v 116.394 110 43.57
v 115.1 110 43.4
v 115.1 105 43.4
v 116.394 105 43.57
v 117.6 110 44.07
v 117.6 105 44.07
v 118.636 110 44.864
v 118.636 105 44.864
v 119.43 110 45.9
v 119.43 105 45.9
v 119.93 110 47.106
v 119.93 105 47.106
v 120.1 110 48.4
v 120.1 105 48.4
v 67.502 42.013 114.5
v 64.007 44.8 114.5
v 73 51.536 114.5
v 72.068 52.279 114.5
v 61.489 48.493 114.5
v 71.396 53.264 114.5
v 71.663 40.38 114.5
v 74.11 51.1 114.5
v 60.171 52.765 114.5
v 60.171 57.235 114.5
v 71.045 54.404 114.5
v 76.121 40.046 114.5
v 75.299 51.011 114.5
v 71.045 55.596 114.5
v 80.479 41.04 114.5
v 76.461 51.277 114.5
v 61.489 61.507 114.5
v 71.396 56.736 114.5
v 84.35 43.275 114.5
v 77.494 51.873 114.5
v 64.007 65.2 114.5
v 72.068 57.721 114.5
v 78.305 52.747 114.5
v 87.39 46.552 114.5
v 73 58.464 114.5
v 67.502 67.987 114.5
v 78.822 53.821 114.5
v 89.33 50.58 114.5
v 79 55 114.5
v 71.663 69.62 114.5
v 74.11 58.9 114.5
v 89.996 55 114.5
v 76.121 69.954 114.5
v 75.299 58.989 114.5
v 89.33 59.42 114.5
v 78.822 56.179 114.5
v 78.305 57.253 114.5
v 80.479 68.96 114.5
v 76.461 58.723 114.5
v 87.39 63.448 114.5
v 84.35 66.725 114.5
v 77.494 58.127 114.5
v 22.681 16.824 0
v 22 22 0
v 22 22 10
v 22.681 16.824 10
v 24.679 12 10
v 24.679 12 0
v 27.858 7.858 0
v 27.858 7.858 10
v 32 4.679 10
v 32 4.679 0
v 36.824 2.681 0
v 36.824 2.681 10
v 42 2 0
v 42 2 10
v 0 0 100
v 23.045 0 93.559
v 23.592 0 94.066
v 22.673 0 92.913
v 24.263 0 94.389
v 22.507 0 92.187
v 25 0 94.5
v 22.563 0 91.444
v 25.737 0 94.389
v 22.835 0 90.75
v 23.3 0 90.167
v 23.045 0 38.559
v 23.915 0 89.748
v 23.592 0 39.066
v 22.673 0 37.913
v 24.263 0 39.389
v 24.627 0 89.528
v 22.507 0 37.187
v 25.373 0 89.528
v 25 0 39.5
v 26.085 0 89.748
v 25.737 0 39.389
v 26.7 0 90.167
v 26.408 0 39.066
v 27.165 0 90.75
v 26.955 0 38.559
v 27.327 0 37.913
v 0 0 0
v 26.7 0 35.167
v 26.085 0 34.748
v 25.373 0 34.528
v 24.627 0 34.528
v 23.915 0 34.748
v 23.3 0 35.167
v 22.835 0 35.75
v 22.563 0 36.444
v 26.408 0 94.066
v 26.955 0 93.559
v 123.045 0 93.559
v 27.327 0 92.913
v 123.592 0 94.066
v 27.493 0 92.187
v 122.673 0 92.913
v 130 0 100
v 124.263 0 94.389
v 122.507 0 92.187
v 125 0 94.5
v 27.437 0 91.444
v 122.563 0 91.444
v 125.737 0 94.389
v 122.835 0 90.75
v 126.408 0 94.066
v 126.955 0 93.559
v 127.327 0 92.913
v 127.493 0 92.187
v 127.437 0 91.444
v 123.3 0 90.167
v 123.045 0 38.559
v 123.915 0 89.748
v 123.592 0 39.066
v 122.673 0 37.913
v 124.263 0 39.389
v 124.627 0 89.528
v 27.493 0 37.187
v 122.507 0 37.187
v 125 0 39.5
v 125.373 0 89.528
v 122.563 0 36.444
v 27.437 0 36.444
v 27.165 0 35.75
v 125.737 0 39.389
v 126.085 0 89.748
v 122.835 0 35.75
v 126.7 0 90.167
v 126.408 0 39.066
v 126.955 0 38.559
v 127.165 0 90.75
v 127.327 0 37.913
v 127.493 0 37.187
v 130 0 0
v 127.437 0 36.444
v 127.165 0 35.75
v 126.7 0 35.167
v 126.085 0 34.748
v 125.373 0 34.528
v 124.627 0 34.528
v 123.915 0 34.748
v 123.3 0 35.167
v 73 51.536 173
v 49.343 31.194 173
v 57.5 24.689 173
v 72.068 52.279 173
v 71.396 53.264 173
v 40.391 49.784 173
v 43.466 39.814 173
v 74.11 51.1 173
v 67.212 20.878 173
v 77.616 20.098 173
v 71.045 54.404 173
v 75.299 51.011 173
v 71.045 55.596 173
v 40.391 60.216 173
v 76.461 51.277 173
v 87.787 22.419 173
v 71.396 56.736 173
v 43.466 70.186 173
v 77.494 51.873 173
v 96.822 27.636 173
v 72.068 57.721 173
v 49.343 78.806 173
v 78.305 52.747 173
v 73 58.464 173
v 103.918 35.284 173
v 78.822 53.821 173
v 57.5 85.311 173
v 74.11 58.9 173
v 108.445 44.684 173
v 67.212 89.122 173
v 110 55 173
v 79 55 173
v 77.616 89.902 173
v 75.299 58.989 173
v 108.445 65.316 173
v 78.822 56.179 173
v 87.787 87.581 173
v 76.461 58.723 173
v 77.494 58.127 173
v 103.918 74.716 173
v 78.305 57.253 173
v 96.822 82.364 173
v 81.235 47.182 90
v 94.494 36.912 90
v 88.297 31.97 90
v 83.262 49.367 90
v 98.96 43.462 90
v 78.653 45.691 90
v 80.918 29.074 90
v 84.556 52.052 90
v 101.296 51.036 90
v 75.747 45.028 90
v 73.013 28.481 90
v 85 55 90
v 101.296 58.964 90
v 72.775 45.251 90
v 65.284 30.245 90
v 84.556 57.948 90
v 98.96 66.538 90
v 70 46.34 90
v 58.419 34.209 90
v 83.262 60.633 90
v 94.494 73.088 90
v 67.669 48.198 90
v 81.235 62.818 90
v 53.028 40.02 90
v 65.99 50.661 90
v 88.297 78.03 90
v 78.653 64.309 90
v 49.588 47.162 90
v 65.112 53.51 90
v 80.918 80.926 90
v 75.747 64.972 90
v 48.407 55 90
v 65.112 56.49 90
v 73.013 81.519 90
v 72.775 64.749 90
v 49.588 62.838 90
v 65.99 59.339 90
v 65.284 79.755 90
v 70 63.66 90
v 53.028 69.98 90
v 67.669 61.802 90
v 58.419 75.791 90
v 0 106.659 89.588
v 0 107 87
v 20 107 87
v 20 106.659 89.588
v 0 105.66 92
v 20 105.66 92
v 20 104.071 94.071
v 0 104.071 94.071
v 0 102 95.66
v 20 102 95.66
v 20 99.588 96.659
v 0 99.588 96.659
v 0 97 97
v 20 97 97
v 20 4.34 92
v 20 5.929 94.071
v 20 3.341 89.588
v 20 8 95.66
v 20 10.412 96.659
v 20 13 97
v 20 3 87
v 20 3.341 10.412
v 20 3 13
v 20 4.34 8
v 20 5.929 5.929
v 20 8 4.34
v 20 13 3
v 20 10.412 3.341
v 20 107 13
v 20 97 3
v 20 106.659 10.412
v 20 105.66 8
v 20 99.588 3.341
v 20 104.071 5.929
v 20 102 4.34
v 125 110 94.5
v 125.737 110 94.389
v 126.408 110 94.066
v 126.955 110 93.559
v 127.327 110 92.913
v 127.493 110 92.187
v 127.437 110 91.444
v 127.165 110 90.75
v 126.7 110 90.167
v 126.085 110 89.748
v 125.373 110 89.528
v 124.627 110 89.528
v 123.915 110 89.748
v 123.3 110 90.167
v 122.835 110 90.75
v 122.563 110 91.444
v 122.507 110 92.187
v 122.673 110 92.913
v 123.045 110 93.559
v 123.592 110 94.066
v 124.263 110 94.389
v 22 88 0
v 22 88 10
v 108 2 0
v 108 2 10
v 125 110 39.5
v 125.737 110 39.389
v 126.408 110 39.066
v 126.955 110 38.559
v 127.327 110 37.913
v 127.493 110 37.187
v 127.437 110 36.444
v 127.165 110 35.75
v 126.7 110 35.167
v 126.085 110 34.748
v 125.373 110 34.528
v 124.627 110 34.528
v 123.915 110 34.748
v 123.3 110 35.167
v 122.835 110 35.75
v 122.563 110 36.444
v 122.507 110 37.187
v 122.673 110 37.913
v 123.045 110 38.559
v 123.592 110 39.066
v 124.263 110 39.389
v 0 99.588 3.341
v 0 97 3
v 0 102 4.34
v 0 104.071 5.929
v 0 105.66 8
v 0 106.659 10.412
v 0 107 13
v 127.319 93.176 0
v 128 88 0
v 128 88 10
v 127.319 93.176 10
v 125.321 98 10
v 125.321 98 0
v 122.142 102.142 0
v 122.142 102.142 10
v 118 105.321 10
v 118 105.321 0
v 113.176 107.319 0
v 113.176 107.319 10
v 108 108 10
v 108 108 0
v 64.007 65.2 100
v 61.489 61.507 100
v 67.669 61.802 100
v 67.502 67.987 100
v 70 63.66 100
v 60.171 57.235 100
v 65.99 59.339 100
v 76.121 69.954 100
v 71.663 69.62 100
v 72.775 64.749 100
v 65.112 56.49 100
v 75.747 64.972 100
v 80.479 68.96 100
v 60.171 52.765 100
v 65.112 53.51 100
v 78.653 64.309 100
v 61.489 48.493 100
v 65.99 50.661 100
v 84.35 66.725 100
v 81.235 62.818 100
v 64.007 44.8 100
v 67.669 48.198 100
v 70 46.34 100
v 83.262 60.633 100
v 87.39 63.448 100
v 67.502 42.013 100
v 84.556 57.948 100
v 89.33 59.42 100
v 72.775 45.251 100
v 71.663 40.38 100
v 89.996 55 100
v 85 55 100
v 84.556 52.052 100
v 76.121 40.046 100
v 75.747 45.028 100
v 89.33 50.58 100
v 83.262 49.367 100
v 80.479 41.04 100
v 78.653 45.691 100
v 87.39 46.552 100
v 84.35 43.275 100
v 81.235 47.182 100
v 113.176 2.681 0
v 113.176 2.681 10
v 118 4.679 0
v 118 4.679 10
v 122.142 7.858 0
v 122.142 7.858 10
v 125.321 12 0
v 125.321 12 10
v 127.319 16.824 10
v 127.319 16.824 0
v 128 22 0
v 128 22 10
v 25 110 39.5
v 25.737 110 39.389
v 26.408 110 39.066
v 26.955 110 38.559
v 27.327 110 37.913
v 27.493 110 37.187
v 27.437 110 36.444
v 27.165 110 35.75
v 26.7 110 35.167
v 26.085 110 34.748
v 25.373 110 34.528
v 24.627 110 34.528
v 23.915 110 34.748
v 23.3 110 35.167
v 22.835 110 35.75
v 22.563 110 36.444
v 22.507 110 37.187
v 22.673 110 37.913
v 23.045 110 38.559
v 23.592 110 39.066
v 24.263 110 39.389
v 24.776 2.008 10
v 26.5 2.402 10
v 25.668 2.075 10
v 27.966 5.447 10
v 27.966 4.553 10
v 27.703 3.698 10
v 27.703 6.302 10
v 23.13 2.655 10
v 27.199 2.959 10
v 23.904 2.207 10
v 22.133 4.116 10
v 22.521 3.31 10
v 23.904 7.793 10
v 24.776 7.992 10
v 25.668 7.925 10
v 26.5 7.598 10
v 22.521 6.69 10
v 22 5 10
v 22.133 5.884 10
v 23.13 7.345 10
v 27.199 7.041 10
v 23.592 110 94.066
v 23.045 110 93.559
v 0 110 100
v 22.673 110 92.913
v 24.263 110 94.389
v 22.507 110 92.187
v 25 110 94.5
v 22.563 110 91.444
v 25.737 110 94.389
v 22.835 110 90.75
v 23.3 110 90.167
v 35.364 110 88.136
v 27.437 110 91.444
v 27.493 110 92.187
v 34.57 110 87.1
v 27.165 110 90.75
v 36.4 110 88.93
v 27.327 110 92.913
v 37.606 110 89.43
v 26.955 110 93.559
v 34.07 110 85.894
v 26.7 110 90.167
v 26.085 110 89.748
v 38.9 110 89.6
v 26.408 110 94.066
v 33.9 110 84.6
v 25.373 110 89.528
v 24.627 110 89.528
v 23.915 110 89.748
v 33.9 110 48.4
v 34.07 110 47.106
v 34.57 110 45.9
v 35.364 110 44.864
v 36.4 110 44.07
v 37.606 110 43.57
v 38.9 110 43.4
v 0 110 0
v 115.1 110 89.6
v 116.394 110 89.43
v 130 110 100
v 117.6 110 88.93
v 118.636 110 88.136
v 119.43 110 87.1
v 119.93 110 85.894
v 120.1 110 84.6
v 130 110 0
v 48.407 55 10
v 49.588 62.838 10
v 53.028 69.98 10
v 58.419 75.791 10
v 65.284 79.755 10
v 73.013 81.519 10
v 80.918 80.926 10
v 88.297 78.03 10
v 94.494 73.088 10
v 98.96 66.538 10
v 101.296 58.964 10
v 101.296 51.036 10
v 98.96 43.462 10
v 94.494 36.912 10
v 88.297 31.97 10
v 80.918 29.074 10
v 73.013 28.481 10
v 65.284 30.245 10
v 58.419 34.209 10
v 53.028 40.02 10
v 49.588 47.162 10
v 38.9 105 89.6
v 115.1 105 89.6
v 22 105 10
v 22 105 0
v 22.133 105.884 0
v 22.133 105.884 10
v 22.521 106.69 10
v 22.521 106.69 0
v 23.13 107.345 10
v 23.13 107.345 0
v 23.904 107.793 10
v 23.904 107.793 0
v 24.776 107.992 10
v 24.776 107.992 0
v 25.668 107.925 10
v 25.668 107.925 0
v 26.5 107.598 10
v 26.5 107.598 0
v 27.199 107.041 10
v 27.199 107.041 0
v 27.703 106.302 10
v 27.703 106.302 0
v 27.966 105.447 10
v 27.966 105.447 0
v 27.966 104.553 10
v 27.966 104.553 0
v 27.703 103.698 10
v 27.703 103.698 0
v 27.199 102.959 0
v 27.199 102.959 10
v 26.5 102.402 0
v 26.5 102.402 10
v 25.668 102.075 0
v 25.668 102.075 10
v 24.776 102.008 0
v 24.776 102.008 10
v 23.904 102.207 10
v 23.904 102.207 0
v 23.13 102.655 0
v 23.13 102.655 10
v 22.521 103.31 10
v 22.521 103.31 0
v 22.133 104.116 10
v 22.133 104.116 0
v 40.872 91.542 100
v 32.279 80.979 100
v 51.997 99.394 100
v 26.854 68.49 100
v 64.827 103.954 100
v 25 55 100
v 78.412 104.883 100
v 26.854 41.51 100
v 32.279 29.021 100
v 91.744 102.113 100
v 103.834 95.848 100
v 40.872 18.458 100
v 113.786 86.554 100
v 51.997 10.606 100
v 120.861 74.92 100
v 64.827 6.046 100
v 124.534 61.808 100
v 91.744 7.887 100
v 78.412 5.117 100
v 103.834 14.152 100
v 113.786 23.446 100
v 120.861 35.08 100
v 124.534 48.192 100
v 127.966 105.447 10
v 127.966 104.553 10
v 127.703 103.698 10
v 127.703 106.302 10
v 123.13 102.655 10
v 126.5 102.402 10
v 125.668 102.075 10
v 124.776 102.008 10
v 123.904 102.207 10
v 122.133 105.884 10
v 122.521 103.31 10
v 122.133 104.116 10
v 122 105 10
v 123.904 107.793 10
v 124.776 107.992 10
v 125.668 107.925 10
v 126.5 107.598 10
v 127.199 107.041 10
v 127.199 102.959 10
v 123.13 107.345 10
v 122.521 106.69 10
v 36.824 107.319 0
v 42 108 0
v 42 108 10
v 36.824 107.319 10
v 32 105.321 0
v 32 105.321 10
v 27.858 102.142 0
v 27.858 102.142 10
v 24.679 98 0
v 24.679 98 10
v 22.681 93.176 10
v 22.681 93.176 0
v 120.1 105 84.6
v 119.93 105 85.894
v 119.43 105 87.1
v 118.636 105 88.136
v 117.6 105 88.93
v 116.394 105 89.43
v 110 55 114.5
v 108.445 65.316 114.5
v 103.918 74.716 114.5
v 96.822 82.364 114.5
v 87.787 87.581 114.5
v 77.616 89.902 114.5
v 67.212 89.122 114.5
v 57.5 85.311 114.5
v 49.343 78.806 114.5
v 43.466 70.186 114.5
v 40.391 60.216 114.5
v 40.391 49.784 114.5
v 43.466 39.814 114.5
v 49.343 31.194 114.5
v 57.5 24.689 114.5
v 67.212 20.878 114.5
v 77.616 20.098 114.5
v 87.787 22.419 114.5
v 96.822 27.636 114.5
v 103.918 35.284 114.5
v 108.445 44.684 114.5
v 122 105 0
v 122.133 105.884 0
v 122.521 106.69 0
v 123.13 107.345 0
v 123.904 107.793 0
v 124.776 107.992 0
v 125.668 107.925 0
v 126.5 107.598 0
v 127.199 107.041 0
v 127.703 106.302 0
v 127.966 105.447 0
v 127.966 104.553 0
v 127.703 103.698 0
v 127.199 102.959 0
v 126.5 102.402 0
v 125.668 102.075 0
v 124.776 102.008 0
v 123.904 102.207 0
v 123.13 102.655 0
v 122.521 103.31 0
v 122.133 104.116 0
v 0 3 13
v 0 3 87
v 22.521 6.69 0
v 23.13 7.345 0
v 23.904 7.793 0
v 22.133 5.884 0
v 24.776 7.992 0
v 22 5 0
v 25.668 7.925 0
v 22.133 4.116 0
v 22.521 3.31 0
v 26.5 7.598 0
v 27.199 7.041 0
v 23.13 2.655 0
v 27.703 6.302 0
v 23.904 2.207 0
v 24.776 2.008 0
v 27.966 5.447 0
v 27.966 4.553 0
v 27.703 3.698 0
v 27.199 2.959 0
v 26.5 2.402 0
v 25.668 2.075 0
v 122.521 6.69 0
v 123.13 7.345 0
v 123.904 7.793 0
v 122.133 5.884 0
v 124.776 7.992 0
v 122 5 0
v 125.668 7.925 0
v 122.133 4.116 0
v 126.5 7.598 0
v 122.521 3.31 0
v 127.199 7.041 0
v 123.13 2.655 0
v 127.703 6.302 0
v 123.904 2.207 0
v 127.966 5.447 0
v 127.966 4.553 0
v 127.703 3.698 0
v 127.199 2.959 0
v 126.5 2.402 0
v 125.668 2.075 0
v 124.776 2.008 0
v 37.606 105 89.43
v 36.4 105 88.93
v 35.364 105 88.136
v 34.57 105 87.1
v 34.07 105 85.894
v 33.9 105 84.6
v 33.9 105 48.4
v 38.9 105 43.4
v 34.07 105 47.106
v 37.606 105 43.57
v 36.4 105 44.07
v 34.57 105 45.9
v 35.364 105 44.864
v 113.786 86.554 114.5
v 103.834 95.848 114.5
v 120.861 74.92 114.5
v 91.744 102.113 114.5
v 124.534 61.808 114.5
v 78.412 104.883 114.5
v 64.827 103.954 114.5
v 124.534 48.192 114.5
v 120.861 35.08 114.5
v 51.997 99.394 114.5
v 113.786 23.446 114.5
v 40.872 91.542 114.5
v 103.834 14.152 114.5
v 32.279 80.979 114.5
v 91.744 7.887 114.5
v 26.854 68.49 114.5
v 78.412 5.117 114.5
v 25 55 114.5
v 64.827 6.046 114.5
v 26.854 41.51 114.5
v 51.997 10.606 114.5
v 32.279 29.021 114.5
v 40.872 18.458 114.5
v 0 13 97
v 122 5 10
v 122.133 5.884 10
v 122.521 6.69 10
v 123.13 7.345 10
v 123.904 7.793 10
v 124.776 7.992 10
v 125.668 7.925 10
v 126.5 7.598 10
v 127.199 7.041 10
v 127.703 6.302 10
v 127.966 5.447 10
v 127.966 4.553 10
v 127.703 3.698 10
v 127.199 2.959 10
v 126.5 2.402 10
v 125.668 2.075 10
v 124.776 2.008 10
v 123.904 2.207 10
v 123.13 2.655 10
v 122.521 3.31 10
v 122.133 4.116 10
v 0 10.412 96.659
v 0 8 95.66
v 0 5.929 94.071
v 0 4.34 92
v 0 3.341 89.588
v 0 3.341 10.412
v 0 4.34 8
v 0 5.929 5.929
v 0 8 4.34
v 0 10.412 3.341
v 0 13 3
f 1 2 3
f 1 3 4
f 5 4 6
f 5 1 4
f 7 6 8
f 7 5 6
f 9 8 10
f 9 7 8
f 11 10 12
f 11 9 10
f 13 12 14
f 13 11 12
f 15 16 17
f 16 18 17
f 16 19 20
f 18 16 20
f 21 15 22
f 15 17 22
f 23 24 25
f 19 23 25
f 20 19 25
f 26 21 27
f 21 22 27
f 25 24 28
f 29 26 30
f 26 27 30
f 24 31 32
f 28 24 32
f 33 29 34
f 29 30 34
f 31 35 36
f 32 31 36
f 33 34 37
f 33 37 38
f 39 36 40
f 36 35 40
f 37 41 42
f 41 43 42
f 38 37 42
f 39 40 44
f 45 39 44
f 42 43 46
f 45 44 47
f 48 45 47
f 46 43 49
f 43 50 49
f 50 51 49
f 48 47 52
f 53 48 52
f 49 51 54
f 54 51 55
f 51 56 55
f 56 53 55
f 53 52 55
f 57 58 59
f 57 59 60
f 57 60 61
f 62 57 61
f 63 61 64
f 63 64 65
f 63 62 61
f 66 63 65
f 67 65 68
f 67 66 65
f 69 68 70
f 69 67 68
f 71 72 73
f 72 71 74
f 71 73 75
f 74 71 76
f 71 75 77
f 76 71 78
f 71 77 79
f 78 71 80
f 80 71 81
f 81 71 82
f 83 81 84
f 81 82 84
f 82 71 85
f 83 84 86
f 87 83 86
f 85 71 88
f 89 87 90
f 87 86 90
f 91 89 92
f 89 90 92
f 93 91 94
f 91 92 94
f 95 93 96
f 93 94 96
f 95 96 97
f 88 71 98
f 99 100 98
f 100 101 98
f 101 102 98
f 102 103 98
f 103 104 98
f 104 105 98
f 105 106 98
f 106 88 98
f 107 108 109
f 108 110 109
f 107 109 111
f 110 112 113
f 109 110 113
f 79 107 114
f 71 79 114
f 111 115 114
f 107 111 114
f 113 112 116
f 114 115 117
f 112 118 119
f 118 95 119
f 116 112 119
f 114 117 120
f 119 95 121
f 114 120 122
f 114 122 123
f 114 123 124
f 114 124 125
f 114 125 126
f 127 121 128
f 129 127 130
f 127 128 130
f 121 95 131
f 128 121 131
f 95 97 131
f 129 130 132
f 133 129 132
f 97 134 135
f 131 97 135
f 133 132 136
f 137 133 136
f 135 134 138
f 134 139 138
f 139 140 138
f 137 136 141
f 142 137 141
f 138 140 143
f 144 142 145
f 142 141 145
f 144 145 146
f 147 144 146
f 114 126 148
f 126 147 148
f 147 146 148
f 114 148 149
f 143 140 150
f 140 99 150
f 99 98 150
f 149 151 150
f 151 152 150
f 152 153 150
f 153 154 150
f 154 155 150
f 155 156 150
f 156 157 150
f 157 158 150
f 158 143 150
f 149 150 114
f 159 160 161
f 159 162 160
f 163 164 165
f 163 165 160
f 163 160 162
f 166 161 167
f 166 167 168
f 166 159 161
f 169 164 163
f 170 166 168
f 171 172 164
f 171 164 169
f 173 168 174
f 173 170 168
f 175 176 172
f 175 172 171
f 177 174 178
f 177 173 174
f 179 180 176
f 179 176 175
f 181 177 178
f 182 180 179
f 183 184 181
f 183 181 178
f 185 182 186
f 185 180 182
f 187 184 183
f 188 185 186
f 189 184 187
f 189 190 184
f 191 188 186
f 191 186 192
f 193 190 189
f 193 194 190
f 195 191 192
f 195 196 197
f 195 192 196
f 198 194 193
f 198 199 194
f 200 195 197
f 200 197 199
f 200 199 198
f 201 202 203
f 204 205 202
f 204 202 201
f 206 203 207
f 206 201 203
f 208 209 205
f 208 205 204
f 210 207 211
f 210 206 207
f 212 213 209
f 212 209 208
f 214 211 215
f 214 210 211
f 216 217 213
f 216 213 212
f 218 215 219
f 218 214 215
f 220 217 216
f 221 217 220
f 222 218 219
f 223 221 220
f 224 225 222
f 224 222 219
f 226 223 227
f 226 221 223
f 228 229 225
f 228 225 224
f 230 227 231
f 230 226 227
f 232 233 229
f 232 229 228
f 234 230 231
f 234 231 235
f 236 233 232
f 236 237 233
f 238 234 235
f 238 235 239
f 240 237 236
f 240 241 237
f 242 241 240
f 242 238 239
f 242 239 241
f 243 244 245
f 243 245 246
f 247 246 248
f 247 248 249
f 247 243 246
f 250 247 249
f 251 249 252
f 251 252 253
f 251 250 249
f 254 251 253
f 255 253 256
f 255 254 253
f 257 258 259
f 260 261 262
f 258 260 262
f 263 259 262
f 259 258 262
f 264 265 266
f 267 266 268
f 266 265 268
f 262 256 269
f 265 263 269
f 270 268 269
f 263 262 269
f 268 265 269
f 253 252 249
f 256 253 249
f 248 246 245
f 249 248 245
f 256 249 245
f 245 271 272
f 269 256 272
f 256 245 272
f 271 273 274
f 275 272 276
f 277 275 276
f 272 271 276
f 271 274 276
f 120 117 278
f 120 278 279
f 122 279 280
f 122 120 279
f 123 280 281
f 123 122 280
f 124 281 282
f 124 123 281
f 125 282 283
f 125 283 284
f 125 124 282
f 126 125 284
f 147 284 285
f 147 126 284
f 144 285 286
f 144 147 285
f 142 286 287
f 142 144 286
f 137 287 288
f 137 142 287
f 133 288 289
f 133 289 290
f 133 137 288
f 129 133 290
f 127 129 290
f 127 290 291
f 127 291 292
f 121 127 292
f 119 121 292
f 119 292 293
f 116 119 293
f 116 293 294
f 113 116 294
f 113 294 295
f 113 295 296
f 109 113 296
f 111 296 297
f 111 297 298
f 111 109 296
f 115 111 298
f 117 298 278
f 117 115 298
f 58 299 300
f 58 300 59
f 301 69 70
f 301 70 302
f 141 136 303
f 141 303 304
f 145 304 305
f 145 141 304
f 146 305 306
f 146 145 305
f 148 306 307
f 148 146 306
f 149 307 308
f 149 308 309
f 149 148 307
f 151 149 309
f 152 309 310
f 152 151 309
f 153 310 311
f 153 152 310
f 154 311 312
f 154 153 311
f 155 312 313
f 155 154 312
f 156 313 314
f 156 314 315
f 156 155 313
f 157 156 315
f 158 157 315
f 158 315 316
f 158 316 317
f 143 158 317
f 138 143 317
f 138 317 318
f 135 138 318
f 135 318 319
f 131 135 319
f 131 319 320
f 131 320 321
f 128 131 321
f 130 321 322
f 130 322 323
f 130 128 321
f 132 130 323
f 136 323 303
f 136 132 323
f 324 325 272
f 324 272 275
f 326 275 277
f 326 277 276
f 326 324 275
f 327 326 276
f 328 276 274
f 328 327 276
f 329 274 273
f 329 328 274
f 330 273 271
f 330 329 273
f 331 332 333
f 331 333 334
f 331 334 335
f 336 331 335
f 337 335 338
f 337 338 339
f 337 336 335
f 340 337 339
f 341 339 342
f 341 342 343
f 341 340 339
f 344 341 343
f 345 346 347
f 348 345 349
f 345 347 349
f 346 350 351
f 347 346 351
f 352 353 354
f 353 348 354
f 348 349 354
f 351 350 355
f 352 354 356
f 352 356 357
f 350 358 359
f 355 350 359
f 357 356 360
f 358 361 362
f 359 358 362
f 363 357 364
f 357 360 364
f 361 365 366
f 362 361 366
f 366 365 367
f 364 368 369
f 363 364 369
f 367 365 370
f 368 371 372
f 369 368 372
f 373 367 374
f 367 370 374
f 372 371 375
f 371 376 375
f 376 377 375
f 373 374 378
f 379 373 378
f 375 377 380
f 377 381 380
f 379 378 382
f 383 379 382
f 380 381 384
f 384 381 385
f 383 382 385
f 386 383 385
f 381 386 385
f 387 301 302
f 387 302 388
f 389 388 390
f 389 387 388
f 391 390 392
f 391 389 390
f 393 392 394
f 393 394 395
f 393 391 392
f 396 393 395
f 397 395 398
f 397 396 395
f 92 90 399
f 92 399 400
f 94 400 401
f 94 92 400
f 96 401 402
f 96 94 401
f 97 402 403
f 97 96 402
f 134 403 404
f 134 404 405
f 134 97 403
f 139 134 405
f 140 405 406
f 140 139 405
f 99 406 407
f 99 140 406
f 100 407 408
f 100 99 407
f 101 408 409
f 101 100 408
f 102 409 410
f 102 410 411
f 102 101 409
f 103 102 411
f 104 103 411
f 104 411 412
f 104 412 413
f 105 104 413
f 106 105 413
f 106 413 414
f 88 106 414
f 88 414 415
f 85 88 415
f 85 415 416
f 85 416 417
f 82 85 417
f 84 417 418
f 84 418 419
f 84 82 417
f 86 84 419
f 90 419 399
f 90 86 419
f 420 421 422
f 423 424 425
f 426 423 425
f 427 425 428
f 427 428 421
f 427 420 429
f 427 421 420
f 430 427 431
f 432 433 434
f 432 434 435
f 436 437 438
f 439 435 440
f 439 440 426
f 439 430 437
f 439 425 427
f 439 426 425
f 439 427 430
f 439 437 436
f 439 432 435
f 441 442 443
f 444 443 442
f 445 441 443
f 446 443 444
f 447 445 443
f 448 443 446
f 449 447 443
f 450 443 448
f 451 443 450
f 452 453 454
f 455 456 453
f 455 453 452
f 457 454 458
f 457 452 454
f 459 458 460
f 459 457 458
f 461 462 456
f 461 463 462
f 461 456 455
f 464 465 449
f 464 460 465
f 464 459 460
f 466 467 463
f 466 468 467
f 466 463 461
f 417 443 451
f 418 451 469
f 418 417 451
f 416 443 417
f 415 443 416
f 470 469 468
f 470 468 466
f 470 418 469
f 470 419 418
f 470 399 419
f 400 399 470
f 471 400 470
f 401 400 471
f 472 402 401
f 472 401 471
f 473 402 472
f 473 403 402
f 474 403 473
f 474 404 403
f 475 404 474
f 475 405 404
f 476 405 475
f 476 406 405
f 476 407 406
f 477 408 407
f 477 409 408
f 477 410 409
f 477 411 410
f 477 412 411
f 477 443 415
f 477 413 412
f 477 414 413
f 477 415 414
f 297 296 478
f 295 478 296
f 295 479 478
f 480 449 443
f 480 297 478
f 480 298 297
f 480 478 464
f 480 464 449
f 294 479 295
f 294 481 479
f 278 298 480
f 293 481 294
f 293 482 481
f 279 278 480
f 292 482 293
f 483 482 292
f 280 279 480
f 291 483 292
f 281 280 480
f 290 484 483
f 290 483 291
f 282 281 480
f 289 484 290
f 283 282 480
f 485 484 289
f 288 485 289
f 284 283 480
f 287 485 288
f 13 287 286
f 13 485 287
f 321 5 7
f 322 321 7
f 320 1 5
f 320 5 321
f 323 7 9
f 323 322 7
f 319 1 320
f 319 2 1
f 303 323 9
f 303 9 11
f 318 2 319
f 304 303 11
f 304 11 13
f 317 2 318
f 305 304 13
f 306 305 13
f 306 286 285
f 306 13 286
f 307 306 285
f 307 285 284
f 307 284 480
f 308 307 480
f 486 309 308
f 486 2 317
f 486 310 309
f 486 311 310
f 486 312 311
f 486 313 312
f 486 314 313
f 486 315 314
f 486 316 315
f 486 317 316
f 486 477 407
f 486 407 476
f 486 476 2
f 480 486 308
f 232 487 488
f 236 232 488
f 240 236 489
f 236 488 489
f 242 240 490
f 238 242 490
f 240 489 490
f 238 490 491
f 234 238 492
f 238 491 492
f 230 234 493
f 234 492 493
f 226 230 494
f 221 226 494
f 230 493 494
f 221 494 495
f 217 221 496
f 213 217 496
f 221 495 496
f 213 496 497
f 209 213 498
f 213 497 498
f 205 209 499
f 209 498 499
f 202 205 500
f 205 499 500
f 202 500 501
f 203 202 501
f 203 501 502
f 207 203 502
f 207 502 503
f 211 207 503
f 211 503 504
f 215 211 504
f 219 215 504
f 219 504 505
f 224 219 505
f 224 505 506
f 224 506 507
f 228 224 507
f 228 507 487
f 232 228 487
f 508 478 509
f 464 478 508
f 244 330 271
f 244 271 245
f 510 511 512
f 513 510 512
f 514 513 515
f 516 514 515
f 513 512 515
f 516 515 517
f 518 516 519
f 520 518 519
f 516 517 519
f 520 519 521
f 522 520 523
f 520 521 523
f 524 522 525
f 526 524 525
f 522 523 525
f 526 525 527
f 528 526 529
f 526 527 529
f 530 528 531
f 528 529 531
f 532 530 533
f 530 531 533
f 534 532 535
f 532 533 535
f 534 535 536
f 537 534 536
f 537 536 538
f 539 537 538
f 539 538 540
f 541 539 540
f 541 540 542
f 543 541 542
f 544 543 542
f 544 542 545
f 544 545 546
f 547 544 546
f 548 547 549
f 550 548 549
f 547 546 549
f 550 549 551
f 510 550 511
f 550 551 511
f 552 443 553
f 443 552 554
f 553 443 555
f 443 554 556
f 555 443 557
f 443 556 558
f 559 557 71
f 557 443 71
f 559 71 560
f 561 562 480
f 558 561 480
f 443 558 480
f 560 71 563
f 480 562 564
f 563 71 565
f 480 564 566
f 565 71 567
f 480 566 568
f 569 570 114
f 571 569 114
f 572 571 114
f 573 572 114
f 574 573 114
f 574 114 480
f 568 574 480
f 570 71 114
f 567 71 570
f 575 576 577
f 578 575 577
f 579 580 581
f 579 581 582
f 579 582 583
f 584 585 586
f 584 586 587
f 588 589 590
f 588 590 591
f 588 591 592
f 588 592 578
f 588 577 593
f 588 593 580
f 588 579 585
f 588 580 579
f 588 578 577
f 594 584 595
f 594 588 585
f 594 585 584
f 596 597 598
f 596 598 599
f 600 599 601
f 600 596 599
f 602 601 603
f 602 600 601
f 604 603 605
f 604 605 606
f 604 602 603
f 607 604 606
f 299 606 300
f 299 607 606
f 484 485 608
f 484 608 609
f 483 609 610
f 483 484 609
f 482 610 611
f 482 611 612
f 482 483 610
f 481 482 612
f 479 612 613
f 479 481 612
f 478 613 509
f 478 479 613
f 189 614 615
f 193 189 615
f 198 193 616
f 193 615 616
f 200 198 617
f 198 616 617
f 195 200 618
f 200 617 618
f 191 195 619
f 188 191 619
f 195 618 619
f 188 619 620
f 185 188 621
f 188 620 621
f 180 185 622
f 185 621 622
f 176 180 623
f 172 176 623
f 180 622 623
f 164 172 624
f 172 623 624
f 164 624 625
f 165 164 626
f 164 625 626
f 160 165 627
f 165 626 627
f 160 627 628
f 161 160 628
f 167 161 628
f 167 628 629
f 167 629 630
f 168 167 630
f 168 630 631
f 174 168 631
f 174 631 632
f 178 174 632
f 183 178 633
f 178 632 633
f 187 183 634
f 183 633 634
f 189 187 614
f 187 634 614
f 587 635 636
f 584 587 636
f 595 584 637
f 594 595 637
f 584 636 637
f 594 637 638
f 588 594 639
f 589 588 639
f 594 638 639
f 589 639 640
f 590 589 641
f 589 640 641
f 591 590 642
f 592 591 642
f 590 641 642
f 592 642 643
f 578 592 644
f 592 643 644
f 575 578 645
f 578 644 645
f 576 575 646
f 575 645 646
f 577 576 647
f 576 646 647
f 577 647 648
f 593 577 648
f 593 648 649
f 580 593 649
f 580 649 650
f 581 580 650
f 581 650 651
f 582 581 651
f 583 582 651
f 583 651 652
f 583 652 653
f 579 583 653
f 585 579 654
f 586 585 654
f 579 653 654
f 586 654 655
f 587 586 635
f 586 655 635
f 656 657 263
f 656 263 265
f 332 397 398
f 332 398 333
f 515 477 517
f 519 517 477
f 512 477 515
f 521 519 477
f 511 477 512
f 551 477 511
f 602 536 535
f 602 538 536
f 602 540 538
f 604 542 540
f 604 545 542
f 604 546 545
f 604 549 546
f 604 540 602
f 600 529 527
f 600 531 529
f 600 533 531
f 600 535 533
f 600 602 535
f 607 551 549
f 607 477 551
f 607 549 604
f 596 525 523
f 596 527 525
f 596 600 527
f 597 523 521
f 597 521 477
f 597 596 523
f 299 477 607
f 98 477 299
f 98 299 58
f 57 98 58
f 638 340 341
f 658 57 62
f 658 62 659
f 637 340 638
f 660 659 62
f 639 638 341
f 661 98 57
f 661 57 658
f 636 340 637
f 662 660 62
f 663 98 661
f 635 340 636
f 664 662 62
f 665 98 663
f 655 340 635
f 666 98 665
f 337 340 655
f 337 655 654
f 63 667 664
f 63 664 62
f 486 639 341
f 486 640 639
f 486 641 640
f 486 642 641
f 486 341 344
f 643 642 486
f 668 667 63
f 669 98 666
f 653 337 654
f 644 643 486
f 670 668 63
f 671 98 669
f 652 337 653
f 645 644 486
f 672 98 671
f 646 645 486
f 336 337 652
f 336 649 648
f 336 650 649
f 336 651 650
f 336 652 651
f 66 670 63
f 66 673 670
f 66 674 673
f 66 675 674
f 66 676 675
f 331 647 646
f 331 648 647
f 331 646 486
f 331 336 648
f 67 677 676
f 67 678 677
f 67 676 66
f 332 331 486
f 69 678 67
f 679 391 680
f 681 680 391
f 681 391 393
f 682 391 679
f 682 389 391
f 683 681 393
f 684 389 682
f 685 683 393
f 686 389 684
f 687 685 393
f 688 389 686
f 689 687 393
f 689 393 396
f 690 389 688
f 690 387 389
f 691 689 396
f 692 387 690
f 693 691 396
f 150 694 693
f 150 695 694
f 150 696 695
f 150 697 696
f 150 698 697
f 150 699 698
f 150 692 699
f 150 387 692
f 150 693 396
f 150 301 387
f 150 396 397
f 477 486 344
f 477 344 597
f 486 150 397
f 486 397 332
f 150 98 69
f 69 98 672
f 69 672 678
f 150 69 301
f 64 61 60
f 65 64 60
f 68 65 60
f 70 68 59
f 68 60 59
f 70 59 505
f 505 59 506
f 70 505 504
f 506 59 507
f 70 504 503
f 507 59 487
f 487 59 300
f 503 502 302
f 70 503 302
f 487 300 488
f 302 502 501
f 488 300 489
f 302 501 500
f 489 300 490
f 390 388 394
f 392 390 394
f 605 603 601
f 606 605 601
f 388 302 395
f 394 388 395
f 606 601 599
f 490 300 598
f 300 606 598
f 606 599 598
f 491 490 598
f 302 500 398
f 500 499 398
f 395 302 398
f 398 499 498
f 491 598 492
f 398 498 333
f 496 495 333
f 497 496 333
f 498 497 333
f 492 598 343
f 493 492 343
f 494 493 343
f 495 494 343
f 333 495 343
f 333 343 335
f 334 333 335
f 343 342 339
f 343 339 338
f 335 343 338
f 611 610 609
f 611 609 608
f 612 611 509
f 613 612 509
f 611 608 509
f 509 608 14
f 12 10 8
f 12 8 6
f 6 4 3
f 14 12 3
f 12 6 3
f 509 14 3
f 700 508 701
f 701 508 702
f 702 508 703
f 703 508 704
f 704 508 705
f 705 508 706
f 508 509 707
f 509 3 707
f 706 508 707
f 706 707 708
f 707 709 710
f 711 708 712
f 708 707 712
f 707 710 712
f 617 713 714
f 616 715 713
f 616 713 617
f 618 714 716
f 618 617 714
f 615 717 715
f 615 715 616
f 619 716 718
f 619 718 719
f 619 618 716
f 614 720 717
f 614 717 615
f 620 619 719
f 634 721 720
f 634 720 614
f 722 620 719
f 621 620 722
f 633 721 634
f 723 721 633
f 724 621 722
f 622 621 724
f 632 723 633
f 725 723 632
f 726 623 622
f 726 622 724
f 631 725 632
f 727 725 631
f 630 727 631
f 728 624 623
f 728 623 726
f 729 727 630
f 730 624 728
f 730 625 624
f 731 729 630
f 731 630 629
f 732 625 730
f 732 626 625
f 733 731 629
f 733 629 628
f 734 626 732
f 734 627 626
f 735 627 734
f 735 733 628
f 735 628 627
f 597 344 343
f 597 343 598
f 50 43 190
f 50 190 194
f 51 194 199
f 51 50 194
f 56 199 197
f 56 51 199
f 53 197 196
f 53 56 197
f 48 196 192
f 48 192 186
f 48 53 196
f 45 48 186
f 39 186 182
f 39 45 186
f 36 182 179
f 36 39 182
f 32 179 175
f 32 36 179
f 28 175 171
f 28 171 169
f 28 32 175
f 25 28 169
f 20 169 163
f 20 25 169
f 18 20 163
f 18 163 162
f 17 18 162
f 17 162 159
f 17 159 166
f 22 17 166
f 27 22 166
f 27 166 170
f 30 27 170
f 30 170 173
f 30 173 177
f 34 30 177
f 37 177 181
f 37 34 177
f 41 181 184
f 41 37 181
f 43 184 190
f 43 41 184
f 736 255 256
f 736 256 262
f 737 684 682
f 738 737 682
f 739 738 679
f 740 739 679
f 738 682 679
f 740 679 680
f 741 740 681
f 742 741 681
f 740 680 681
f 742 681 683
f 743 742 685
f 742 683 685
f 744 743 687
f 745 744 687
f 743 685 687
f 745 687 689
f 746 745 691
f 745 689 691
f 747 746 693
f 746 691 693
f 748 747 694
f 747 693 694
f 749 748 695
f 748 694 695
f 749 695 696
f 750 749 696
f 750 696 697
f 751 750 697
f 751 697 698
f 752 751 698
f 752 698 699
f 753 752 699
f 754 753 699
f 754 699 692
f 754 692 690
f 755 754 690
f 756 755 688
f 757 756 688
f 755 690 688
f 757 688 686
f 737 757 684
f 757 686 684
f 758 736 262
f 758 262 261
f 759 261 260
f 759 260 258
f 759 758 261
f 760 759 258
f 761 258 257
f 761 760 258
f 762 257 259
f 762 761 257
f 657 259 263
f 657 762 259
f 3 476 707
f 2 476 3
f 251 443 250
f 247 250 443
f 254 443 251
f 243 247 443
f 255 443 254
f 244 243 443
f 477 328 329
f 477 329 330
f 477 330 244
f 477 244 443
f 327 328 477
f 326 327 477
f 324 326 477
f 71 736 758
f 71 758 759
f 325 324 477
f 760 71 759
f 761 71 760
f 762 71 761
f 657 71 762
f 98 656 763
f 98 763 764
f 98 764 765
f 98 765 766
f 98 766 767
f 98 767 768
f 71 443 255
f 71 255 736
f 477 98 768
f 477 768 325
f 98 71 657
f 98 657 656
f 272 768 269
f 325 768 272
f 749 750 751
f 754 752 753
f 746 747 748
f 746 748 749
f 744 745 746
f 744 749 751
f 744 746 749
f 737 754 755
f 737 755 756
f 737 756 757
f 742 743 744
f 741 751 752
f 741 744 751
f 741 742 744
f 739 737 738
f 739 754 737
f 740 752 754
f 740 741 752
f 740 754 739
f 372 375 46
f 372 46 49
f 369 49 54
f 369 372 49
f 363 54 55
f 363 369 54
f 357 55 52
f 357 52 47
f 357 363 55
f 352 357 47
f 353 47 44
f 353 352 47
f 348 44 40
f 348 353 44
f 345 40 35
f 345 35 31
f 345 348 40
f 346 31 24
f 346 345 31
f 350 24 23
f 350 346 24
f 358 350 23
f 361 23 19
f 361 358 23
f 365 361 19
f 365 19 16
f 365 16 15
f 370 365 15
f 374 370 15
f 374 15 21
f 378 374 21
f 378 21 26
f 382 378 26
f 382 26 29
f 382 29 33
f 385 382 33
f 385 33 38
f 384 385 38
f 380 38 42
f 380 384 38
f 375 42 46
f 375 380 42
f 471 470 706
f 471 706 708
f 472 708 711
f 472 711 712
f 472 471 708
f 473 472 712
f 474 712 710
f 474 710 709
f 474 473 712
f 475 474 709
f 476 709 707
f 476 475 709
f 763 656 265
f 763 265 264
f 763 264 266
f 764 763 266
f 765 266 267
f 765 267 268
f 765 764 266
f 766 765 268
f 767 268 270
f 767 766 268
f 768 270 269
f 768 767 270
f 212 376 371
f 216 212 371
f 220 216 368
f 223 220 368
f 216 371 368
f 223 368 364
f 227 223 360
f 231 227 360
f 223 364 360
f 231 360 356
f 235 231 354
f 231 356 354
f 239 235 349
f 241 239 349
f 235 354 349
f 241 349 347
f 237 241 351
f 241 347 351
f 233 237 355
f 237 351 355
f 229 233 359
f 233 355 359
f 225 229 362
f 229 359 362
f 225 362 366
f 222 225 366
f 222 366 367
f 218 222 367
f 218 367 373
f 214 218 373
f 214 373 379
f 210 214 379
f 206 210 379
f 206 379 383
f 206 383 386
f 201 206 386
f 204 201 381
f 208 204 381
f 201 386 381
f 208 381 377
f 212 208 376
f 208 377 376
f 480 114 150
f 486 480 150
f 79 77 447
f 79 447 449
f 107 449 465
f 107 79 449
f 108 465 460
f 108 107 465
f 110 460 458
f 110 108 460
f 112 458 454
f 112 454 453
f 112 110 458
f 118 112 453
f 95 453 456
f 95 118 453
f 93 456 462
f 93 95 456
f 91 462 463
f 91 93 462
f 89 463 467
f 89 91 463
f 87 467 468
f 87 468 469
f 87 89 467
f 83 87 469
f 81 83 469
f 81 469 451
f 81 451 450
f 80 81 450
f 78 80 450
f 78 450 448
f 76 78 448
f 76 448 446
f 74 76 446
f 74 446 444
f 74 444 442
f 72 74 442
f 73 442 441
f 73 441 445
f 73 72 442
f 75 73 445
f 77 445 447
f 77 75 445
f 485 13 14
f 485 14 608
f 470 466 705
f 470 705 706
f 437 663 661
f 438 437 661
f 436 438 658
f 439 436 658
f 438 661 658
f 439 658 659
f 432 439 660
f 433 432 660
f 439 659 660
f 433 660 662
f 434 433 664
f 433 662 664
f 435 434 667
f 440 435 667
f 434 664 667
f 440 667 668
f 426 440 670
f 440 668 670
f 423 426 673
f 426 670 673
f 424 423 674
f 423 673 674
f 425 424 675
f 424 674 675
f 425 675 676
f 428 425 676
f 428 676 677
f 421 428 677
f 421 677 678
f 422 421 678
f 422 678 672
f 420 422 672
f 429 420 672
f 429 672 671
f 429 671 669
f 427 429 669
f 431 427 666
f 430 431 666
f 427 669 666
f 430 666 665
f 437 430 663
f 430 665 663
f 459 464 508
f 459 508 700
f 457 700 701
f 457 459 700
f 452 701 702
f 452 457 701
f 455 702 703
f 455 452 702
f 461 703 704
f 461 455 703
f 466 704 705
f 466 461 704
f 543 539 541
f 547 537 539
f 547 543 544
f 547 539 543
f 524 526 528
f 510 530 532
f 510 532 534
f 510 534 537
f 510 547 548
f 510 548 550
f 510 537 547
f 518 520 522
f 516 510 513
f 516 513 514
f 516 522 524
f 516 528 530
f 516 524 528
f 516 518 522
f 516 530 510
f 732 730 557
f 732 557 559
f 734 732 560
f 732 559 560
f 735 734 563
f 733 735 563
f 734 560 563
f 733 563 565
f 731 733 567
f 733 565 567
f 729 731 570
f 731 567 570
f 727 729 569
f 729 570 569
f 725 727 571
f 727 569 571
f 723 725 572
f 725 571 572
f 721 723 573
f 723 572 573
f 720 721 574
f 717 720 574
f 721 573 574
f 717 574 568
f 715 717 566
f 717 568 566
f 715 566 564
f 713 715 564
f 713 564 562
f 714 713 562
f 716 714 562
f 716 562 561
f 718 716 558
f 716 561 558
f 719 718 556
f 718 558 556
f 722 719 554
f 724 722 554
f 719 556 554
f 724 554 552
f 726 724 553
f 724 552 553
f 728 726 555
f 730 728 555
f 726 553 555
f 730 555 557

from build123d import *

# Parameters (mm, degrees)
SKETCH1_W           = 130
SKETCH1_H           = 100
SKETCH1_R           = 2.5
BOSS_EXTRUDE1_DEPTH = 110
CUT_EXTRUDE1_DEPTH  = 5
SKETCH3_R           = 26.593196083
CUT_EXTRUDE2_DEPTH  = 90
SKETCH4_R           = 3
CUT_EXTRUDE3_DEPTH  = 10
CUT_EXTRUDE4_DEPTH  = 20
SKETCH8_R           = 10
CUT_EXTRUDE5_DEPTH  = 10
SKETCH9_R           = 50
SKETCH9_R_2         = 14.996239462
BOSS_EXTRUDE3_DEPTH = 14.5
SKETCH10_R          = 35
SKETCH10_R_2        = 4
BOSS_EXTRUDE4_DEPTH = 58.5


with BuildPart() as part:
    # Sketch1 → Boss-Extrude1 (new body)
    with BuildSketch(Plane(origin=(0, 0, 0), x_dir=(1, 0, 0), z_dir=(0, 1, 0))):
        with Locations((65, -50)):
            Rectangle(SKETCH1_W, SKETCH1_H)
        with Locations(Location((25, -37, 0), (0, 0, 270))):  # turned: the seam where the file's is
            Circle(SKETCH1_R, mode=Mode.SUBTRACT)
        with Locations(Location((25, -92, 0), (0, 0, 270))):  # turned: the seam where the file's is
            Circle(SKETCH1_R, mode=Mode.SUBTRACT)
        with Locations(Location((125, -37, 0), (0, 0, 270))):  # turned: the seam where the file's is
            Circle(SKETCH1_R, mode=Mode.SUBTRACT)
        with Locations(Location((125, -92, 0), (0, 0, 270))):  # turned: the seam where the file's is
            Circle(SKETCH1_R, mode=Mode.SUBTRACT)
    extrude(amount=BOSS_EXTRUDE1_DEPTH)

    # Sketch2 → Cut-Extrude1 (cut)
    with BuildSketch(Plane(origin=(0, 110, 0), x_dir=(1, 0, 0), z_dir=(0, 1, 0))):
        with BuildLine():
            Line((38.9, -43.4), (115.1, -43.4))
            ThreePointArc((115.1, -43.4), (118.635533906, -44.864466094), (120.1, -48.4))
            Line((120.1, -48.4), (120.1, -84.6))
            ThreePointArc((120.1, -84.6), (118.635533906, -88.135533906), (115.1, -89.6))
            Line((115.1, -89.6), (38.9, -89.6))
            ThreePointArc((38.9, -89.6), (35.364466094, -88.135533906), (33.9, -84.6))
            Line((33.9, -84.6), (33.9, -48.4))
            ThreePointArc((33.9, -48.4), (35.364466094, -44.864466094), (38.9, -43.4))
        make_face()
    extrude(amount=-CUT_EXTRUDE1_DEPTH, mode=Mode.SUBTRACT)

    # Sketch3 → Cut-Extrude2 (cut)
    with BuildSketch(Plane(origin=(0, 0, 0), x_dir=(-1, 0, 0), z_dir=(0, 0, -1))):
        with Locations((-75, 55)):
            Circle(SKETCH3_R)
    extrude(amount=-CUT_EXTRUDE2_DEPTH, mode=Mode.SUBTRACT)

    # Sketch4 → Cut-Extrude3 (cut)
    with BuildSketch(Plane(origin=(0, 0, 0), x_dir=(-1, 0, 0), z_dir=(0, 0, -1))):
        with Locations((-125, 105)):
            Circle(SKETCH4_R)
        with Locations((-25, 105)):
            Circle(SKETCH4_R)
        with Locations((-125, 5)):
            Circle(SKETCH4_R)
        with Locations((-25, 5)):
            Circle(SKETCH4_R)
        with BuildLine():
            Line((-108, 108), (-42, 108))
            ThreePointArc((-42, 108), (-27.857864376, 102.142135624), (-22, 88))
            Line((-22, 88), (-22, 22))
            ThreePointArc((-22, 22), (-27.857864376, 7.857864376), (-42, 2))
            Line((-42, 2), (-108, 2))
            ThreePointArc((-108, 2), (-122.142135624, 7.857864376), (-128, 22))
            Line((-128, 22), (-128, 88))
            ThreePointArc((-128, 88), (-122.142135624, 102.142135624), (-108, 108))
        make_face()
    extrude(amount=-CUT_EXTRUDE3_DEPTH, mode=Mode.SUBTRACT)

    # Sketch6 → Cut-Extrude4 (cut)
    with BuildSketch(Plane.ZY):
        with BuildLine():
            Line((3, 13), (3, 97))
            ThreePointArc((3, 97), (5.928932188, 104.071067812), (13, 107))
            Line((13, 107), (87, 107))
            ThreePointArc((87, 107), (94.071067812, 104.071067812), (97, 97))
            Line((97, 97), (97, 13))
            ThreePointArc((97, 13), (94.071067812, 5.928932188), (87, 3))
            Line((87, 3), (13, 3))
            ThreePointArc((13, 3), (5.928932188, 5.928932188), (3, 13))
        make_face()
    extrude(amount=-CUT_EXTRUDE4_DEPTH, mode=Mode.SUBTRACT)

    # Sketch8 → Cut-Extrude5 (cut)
    with BuildSketch(Plane.XY.offset(100)):
        with Locations((75, 55)):
            Circle(SKETCH8_R)
    extrude(amount=-CUT_EXTRUDE5_DEPTH, mode=Mode.SUBTRACT)

    # Sketch9 → Boss-Extrude3 (add)
    with BuildSketch(Plane.XY.offset(100)):
        with Locations(Location((75, 55, 0), (0, 0, 180))):  # turned: the seam where the file's is
            Circle(SKETCH9_R)
        with Locations((75, 55)):
            Circle(SKETCH9_R_2, mode=Mode.SUBTRACT)
    extrude(amount=BOSS_EXTRUDE3_DEPTH)

    # Sketch10 → Boss-Extrude4 (add)
    with BuildSketch(Plane.XY.offset(114.5)):
        with Locations((75, 55)):
            Circle(SKETCH10_R)
        with Locations((75, 55)):
            Circle(SKETCH10_R_2, mode=Mode.SUBTRACT)
    extrude(amount=BOSS_EXTRUDE4_DEPTH)


solid = part.part
